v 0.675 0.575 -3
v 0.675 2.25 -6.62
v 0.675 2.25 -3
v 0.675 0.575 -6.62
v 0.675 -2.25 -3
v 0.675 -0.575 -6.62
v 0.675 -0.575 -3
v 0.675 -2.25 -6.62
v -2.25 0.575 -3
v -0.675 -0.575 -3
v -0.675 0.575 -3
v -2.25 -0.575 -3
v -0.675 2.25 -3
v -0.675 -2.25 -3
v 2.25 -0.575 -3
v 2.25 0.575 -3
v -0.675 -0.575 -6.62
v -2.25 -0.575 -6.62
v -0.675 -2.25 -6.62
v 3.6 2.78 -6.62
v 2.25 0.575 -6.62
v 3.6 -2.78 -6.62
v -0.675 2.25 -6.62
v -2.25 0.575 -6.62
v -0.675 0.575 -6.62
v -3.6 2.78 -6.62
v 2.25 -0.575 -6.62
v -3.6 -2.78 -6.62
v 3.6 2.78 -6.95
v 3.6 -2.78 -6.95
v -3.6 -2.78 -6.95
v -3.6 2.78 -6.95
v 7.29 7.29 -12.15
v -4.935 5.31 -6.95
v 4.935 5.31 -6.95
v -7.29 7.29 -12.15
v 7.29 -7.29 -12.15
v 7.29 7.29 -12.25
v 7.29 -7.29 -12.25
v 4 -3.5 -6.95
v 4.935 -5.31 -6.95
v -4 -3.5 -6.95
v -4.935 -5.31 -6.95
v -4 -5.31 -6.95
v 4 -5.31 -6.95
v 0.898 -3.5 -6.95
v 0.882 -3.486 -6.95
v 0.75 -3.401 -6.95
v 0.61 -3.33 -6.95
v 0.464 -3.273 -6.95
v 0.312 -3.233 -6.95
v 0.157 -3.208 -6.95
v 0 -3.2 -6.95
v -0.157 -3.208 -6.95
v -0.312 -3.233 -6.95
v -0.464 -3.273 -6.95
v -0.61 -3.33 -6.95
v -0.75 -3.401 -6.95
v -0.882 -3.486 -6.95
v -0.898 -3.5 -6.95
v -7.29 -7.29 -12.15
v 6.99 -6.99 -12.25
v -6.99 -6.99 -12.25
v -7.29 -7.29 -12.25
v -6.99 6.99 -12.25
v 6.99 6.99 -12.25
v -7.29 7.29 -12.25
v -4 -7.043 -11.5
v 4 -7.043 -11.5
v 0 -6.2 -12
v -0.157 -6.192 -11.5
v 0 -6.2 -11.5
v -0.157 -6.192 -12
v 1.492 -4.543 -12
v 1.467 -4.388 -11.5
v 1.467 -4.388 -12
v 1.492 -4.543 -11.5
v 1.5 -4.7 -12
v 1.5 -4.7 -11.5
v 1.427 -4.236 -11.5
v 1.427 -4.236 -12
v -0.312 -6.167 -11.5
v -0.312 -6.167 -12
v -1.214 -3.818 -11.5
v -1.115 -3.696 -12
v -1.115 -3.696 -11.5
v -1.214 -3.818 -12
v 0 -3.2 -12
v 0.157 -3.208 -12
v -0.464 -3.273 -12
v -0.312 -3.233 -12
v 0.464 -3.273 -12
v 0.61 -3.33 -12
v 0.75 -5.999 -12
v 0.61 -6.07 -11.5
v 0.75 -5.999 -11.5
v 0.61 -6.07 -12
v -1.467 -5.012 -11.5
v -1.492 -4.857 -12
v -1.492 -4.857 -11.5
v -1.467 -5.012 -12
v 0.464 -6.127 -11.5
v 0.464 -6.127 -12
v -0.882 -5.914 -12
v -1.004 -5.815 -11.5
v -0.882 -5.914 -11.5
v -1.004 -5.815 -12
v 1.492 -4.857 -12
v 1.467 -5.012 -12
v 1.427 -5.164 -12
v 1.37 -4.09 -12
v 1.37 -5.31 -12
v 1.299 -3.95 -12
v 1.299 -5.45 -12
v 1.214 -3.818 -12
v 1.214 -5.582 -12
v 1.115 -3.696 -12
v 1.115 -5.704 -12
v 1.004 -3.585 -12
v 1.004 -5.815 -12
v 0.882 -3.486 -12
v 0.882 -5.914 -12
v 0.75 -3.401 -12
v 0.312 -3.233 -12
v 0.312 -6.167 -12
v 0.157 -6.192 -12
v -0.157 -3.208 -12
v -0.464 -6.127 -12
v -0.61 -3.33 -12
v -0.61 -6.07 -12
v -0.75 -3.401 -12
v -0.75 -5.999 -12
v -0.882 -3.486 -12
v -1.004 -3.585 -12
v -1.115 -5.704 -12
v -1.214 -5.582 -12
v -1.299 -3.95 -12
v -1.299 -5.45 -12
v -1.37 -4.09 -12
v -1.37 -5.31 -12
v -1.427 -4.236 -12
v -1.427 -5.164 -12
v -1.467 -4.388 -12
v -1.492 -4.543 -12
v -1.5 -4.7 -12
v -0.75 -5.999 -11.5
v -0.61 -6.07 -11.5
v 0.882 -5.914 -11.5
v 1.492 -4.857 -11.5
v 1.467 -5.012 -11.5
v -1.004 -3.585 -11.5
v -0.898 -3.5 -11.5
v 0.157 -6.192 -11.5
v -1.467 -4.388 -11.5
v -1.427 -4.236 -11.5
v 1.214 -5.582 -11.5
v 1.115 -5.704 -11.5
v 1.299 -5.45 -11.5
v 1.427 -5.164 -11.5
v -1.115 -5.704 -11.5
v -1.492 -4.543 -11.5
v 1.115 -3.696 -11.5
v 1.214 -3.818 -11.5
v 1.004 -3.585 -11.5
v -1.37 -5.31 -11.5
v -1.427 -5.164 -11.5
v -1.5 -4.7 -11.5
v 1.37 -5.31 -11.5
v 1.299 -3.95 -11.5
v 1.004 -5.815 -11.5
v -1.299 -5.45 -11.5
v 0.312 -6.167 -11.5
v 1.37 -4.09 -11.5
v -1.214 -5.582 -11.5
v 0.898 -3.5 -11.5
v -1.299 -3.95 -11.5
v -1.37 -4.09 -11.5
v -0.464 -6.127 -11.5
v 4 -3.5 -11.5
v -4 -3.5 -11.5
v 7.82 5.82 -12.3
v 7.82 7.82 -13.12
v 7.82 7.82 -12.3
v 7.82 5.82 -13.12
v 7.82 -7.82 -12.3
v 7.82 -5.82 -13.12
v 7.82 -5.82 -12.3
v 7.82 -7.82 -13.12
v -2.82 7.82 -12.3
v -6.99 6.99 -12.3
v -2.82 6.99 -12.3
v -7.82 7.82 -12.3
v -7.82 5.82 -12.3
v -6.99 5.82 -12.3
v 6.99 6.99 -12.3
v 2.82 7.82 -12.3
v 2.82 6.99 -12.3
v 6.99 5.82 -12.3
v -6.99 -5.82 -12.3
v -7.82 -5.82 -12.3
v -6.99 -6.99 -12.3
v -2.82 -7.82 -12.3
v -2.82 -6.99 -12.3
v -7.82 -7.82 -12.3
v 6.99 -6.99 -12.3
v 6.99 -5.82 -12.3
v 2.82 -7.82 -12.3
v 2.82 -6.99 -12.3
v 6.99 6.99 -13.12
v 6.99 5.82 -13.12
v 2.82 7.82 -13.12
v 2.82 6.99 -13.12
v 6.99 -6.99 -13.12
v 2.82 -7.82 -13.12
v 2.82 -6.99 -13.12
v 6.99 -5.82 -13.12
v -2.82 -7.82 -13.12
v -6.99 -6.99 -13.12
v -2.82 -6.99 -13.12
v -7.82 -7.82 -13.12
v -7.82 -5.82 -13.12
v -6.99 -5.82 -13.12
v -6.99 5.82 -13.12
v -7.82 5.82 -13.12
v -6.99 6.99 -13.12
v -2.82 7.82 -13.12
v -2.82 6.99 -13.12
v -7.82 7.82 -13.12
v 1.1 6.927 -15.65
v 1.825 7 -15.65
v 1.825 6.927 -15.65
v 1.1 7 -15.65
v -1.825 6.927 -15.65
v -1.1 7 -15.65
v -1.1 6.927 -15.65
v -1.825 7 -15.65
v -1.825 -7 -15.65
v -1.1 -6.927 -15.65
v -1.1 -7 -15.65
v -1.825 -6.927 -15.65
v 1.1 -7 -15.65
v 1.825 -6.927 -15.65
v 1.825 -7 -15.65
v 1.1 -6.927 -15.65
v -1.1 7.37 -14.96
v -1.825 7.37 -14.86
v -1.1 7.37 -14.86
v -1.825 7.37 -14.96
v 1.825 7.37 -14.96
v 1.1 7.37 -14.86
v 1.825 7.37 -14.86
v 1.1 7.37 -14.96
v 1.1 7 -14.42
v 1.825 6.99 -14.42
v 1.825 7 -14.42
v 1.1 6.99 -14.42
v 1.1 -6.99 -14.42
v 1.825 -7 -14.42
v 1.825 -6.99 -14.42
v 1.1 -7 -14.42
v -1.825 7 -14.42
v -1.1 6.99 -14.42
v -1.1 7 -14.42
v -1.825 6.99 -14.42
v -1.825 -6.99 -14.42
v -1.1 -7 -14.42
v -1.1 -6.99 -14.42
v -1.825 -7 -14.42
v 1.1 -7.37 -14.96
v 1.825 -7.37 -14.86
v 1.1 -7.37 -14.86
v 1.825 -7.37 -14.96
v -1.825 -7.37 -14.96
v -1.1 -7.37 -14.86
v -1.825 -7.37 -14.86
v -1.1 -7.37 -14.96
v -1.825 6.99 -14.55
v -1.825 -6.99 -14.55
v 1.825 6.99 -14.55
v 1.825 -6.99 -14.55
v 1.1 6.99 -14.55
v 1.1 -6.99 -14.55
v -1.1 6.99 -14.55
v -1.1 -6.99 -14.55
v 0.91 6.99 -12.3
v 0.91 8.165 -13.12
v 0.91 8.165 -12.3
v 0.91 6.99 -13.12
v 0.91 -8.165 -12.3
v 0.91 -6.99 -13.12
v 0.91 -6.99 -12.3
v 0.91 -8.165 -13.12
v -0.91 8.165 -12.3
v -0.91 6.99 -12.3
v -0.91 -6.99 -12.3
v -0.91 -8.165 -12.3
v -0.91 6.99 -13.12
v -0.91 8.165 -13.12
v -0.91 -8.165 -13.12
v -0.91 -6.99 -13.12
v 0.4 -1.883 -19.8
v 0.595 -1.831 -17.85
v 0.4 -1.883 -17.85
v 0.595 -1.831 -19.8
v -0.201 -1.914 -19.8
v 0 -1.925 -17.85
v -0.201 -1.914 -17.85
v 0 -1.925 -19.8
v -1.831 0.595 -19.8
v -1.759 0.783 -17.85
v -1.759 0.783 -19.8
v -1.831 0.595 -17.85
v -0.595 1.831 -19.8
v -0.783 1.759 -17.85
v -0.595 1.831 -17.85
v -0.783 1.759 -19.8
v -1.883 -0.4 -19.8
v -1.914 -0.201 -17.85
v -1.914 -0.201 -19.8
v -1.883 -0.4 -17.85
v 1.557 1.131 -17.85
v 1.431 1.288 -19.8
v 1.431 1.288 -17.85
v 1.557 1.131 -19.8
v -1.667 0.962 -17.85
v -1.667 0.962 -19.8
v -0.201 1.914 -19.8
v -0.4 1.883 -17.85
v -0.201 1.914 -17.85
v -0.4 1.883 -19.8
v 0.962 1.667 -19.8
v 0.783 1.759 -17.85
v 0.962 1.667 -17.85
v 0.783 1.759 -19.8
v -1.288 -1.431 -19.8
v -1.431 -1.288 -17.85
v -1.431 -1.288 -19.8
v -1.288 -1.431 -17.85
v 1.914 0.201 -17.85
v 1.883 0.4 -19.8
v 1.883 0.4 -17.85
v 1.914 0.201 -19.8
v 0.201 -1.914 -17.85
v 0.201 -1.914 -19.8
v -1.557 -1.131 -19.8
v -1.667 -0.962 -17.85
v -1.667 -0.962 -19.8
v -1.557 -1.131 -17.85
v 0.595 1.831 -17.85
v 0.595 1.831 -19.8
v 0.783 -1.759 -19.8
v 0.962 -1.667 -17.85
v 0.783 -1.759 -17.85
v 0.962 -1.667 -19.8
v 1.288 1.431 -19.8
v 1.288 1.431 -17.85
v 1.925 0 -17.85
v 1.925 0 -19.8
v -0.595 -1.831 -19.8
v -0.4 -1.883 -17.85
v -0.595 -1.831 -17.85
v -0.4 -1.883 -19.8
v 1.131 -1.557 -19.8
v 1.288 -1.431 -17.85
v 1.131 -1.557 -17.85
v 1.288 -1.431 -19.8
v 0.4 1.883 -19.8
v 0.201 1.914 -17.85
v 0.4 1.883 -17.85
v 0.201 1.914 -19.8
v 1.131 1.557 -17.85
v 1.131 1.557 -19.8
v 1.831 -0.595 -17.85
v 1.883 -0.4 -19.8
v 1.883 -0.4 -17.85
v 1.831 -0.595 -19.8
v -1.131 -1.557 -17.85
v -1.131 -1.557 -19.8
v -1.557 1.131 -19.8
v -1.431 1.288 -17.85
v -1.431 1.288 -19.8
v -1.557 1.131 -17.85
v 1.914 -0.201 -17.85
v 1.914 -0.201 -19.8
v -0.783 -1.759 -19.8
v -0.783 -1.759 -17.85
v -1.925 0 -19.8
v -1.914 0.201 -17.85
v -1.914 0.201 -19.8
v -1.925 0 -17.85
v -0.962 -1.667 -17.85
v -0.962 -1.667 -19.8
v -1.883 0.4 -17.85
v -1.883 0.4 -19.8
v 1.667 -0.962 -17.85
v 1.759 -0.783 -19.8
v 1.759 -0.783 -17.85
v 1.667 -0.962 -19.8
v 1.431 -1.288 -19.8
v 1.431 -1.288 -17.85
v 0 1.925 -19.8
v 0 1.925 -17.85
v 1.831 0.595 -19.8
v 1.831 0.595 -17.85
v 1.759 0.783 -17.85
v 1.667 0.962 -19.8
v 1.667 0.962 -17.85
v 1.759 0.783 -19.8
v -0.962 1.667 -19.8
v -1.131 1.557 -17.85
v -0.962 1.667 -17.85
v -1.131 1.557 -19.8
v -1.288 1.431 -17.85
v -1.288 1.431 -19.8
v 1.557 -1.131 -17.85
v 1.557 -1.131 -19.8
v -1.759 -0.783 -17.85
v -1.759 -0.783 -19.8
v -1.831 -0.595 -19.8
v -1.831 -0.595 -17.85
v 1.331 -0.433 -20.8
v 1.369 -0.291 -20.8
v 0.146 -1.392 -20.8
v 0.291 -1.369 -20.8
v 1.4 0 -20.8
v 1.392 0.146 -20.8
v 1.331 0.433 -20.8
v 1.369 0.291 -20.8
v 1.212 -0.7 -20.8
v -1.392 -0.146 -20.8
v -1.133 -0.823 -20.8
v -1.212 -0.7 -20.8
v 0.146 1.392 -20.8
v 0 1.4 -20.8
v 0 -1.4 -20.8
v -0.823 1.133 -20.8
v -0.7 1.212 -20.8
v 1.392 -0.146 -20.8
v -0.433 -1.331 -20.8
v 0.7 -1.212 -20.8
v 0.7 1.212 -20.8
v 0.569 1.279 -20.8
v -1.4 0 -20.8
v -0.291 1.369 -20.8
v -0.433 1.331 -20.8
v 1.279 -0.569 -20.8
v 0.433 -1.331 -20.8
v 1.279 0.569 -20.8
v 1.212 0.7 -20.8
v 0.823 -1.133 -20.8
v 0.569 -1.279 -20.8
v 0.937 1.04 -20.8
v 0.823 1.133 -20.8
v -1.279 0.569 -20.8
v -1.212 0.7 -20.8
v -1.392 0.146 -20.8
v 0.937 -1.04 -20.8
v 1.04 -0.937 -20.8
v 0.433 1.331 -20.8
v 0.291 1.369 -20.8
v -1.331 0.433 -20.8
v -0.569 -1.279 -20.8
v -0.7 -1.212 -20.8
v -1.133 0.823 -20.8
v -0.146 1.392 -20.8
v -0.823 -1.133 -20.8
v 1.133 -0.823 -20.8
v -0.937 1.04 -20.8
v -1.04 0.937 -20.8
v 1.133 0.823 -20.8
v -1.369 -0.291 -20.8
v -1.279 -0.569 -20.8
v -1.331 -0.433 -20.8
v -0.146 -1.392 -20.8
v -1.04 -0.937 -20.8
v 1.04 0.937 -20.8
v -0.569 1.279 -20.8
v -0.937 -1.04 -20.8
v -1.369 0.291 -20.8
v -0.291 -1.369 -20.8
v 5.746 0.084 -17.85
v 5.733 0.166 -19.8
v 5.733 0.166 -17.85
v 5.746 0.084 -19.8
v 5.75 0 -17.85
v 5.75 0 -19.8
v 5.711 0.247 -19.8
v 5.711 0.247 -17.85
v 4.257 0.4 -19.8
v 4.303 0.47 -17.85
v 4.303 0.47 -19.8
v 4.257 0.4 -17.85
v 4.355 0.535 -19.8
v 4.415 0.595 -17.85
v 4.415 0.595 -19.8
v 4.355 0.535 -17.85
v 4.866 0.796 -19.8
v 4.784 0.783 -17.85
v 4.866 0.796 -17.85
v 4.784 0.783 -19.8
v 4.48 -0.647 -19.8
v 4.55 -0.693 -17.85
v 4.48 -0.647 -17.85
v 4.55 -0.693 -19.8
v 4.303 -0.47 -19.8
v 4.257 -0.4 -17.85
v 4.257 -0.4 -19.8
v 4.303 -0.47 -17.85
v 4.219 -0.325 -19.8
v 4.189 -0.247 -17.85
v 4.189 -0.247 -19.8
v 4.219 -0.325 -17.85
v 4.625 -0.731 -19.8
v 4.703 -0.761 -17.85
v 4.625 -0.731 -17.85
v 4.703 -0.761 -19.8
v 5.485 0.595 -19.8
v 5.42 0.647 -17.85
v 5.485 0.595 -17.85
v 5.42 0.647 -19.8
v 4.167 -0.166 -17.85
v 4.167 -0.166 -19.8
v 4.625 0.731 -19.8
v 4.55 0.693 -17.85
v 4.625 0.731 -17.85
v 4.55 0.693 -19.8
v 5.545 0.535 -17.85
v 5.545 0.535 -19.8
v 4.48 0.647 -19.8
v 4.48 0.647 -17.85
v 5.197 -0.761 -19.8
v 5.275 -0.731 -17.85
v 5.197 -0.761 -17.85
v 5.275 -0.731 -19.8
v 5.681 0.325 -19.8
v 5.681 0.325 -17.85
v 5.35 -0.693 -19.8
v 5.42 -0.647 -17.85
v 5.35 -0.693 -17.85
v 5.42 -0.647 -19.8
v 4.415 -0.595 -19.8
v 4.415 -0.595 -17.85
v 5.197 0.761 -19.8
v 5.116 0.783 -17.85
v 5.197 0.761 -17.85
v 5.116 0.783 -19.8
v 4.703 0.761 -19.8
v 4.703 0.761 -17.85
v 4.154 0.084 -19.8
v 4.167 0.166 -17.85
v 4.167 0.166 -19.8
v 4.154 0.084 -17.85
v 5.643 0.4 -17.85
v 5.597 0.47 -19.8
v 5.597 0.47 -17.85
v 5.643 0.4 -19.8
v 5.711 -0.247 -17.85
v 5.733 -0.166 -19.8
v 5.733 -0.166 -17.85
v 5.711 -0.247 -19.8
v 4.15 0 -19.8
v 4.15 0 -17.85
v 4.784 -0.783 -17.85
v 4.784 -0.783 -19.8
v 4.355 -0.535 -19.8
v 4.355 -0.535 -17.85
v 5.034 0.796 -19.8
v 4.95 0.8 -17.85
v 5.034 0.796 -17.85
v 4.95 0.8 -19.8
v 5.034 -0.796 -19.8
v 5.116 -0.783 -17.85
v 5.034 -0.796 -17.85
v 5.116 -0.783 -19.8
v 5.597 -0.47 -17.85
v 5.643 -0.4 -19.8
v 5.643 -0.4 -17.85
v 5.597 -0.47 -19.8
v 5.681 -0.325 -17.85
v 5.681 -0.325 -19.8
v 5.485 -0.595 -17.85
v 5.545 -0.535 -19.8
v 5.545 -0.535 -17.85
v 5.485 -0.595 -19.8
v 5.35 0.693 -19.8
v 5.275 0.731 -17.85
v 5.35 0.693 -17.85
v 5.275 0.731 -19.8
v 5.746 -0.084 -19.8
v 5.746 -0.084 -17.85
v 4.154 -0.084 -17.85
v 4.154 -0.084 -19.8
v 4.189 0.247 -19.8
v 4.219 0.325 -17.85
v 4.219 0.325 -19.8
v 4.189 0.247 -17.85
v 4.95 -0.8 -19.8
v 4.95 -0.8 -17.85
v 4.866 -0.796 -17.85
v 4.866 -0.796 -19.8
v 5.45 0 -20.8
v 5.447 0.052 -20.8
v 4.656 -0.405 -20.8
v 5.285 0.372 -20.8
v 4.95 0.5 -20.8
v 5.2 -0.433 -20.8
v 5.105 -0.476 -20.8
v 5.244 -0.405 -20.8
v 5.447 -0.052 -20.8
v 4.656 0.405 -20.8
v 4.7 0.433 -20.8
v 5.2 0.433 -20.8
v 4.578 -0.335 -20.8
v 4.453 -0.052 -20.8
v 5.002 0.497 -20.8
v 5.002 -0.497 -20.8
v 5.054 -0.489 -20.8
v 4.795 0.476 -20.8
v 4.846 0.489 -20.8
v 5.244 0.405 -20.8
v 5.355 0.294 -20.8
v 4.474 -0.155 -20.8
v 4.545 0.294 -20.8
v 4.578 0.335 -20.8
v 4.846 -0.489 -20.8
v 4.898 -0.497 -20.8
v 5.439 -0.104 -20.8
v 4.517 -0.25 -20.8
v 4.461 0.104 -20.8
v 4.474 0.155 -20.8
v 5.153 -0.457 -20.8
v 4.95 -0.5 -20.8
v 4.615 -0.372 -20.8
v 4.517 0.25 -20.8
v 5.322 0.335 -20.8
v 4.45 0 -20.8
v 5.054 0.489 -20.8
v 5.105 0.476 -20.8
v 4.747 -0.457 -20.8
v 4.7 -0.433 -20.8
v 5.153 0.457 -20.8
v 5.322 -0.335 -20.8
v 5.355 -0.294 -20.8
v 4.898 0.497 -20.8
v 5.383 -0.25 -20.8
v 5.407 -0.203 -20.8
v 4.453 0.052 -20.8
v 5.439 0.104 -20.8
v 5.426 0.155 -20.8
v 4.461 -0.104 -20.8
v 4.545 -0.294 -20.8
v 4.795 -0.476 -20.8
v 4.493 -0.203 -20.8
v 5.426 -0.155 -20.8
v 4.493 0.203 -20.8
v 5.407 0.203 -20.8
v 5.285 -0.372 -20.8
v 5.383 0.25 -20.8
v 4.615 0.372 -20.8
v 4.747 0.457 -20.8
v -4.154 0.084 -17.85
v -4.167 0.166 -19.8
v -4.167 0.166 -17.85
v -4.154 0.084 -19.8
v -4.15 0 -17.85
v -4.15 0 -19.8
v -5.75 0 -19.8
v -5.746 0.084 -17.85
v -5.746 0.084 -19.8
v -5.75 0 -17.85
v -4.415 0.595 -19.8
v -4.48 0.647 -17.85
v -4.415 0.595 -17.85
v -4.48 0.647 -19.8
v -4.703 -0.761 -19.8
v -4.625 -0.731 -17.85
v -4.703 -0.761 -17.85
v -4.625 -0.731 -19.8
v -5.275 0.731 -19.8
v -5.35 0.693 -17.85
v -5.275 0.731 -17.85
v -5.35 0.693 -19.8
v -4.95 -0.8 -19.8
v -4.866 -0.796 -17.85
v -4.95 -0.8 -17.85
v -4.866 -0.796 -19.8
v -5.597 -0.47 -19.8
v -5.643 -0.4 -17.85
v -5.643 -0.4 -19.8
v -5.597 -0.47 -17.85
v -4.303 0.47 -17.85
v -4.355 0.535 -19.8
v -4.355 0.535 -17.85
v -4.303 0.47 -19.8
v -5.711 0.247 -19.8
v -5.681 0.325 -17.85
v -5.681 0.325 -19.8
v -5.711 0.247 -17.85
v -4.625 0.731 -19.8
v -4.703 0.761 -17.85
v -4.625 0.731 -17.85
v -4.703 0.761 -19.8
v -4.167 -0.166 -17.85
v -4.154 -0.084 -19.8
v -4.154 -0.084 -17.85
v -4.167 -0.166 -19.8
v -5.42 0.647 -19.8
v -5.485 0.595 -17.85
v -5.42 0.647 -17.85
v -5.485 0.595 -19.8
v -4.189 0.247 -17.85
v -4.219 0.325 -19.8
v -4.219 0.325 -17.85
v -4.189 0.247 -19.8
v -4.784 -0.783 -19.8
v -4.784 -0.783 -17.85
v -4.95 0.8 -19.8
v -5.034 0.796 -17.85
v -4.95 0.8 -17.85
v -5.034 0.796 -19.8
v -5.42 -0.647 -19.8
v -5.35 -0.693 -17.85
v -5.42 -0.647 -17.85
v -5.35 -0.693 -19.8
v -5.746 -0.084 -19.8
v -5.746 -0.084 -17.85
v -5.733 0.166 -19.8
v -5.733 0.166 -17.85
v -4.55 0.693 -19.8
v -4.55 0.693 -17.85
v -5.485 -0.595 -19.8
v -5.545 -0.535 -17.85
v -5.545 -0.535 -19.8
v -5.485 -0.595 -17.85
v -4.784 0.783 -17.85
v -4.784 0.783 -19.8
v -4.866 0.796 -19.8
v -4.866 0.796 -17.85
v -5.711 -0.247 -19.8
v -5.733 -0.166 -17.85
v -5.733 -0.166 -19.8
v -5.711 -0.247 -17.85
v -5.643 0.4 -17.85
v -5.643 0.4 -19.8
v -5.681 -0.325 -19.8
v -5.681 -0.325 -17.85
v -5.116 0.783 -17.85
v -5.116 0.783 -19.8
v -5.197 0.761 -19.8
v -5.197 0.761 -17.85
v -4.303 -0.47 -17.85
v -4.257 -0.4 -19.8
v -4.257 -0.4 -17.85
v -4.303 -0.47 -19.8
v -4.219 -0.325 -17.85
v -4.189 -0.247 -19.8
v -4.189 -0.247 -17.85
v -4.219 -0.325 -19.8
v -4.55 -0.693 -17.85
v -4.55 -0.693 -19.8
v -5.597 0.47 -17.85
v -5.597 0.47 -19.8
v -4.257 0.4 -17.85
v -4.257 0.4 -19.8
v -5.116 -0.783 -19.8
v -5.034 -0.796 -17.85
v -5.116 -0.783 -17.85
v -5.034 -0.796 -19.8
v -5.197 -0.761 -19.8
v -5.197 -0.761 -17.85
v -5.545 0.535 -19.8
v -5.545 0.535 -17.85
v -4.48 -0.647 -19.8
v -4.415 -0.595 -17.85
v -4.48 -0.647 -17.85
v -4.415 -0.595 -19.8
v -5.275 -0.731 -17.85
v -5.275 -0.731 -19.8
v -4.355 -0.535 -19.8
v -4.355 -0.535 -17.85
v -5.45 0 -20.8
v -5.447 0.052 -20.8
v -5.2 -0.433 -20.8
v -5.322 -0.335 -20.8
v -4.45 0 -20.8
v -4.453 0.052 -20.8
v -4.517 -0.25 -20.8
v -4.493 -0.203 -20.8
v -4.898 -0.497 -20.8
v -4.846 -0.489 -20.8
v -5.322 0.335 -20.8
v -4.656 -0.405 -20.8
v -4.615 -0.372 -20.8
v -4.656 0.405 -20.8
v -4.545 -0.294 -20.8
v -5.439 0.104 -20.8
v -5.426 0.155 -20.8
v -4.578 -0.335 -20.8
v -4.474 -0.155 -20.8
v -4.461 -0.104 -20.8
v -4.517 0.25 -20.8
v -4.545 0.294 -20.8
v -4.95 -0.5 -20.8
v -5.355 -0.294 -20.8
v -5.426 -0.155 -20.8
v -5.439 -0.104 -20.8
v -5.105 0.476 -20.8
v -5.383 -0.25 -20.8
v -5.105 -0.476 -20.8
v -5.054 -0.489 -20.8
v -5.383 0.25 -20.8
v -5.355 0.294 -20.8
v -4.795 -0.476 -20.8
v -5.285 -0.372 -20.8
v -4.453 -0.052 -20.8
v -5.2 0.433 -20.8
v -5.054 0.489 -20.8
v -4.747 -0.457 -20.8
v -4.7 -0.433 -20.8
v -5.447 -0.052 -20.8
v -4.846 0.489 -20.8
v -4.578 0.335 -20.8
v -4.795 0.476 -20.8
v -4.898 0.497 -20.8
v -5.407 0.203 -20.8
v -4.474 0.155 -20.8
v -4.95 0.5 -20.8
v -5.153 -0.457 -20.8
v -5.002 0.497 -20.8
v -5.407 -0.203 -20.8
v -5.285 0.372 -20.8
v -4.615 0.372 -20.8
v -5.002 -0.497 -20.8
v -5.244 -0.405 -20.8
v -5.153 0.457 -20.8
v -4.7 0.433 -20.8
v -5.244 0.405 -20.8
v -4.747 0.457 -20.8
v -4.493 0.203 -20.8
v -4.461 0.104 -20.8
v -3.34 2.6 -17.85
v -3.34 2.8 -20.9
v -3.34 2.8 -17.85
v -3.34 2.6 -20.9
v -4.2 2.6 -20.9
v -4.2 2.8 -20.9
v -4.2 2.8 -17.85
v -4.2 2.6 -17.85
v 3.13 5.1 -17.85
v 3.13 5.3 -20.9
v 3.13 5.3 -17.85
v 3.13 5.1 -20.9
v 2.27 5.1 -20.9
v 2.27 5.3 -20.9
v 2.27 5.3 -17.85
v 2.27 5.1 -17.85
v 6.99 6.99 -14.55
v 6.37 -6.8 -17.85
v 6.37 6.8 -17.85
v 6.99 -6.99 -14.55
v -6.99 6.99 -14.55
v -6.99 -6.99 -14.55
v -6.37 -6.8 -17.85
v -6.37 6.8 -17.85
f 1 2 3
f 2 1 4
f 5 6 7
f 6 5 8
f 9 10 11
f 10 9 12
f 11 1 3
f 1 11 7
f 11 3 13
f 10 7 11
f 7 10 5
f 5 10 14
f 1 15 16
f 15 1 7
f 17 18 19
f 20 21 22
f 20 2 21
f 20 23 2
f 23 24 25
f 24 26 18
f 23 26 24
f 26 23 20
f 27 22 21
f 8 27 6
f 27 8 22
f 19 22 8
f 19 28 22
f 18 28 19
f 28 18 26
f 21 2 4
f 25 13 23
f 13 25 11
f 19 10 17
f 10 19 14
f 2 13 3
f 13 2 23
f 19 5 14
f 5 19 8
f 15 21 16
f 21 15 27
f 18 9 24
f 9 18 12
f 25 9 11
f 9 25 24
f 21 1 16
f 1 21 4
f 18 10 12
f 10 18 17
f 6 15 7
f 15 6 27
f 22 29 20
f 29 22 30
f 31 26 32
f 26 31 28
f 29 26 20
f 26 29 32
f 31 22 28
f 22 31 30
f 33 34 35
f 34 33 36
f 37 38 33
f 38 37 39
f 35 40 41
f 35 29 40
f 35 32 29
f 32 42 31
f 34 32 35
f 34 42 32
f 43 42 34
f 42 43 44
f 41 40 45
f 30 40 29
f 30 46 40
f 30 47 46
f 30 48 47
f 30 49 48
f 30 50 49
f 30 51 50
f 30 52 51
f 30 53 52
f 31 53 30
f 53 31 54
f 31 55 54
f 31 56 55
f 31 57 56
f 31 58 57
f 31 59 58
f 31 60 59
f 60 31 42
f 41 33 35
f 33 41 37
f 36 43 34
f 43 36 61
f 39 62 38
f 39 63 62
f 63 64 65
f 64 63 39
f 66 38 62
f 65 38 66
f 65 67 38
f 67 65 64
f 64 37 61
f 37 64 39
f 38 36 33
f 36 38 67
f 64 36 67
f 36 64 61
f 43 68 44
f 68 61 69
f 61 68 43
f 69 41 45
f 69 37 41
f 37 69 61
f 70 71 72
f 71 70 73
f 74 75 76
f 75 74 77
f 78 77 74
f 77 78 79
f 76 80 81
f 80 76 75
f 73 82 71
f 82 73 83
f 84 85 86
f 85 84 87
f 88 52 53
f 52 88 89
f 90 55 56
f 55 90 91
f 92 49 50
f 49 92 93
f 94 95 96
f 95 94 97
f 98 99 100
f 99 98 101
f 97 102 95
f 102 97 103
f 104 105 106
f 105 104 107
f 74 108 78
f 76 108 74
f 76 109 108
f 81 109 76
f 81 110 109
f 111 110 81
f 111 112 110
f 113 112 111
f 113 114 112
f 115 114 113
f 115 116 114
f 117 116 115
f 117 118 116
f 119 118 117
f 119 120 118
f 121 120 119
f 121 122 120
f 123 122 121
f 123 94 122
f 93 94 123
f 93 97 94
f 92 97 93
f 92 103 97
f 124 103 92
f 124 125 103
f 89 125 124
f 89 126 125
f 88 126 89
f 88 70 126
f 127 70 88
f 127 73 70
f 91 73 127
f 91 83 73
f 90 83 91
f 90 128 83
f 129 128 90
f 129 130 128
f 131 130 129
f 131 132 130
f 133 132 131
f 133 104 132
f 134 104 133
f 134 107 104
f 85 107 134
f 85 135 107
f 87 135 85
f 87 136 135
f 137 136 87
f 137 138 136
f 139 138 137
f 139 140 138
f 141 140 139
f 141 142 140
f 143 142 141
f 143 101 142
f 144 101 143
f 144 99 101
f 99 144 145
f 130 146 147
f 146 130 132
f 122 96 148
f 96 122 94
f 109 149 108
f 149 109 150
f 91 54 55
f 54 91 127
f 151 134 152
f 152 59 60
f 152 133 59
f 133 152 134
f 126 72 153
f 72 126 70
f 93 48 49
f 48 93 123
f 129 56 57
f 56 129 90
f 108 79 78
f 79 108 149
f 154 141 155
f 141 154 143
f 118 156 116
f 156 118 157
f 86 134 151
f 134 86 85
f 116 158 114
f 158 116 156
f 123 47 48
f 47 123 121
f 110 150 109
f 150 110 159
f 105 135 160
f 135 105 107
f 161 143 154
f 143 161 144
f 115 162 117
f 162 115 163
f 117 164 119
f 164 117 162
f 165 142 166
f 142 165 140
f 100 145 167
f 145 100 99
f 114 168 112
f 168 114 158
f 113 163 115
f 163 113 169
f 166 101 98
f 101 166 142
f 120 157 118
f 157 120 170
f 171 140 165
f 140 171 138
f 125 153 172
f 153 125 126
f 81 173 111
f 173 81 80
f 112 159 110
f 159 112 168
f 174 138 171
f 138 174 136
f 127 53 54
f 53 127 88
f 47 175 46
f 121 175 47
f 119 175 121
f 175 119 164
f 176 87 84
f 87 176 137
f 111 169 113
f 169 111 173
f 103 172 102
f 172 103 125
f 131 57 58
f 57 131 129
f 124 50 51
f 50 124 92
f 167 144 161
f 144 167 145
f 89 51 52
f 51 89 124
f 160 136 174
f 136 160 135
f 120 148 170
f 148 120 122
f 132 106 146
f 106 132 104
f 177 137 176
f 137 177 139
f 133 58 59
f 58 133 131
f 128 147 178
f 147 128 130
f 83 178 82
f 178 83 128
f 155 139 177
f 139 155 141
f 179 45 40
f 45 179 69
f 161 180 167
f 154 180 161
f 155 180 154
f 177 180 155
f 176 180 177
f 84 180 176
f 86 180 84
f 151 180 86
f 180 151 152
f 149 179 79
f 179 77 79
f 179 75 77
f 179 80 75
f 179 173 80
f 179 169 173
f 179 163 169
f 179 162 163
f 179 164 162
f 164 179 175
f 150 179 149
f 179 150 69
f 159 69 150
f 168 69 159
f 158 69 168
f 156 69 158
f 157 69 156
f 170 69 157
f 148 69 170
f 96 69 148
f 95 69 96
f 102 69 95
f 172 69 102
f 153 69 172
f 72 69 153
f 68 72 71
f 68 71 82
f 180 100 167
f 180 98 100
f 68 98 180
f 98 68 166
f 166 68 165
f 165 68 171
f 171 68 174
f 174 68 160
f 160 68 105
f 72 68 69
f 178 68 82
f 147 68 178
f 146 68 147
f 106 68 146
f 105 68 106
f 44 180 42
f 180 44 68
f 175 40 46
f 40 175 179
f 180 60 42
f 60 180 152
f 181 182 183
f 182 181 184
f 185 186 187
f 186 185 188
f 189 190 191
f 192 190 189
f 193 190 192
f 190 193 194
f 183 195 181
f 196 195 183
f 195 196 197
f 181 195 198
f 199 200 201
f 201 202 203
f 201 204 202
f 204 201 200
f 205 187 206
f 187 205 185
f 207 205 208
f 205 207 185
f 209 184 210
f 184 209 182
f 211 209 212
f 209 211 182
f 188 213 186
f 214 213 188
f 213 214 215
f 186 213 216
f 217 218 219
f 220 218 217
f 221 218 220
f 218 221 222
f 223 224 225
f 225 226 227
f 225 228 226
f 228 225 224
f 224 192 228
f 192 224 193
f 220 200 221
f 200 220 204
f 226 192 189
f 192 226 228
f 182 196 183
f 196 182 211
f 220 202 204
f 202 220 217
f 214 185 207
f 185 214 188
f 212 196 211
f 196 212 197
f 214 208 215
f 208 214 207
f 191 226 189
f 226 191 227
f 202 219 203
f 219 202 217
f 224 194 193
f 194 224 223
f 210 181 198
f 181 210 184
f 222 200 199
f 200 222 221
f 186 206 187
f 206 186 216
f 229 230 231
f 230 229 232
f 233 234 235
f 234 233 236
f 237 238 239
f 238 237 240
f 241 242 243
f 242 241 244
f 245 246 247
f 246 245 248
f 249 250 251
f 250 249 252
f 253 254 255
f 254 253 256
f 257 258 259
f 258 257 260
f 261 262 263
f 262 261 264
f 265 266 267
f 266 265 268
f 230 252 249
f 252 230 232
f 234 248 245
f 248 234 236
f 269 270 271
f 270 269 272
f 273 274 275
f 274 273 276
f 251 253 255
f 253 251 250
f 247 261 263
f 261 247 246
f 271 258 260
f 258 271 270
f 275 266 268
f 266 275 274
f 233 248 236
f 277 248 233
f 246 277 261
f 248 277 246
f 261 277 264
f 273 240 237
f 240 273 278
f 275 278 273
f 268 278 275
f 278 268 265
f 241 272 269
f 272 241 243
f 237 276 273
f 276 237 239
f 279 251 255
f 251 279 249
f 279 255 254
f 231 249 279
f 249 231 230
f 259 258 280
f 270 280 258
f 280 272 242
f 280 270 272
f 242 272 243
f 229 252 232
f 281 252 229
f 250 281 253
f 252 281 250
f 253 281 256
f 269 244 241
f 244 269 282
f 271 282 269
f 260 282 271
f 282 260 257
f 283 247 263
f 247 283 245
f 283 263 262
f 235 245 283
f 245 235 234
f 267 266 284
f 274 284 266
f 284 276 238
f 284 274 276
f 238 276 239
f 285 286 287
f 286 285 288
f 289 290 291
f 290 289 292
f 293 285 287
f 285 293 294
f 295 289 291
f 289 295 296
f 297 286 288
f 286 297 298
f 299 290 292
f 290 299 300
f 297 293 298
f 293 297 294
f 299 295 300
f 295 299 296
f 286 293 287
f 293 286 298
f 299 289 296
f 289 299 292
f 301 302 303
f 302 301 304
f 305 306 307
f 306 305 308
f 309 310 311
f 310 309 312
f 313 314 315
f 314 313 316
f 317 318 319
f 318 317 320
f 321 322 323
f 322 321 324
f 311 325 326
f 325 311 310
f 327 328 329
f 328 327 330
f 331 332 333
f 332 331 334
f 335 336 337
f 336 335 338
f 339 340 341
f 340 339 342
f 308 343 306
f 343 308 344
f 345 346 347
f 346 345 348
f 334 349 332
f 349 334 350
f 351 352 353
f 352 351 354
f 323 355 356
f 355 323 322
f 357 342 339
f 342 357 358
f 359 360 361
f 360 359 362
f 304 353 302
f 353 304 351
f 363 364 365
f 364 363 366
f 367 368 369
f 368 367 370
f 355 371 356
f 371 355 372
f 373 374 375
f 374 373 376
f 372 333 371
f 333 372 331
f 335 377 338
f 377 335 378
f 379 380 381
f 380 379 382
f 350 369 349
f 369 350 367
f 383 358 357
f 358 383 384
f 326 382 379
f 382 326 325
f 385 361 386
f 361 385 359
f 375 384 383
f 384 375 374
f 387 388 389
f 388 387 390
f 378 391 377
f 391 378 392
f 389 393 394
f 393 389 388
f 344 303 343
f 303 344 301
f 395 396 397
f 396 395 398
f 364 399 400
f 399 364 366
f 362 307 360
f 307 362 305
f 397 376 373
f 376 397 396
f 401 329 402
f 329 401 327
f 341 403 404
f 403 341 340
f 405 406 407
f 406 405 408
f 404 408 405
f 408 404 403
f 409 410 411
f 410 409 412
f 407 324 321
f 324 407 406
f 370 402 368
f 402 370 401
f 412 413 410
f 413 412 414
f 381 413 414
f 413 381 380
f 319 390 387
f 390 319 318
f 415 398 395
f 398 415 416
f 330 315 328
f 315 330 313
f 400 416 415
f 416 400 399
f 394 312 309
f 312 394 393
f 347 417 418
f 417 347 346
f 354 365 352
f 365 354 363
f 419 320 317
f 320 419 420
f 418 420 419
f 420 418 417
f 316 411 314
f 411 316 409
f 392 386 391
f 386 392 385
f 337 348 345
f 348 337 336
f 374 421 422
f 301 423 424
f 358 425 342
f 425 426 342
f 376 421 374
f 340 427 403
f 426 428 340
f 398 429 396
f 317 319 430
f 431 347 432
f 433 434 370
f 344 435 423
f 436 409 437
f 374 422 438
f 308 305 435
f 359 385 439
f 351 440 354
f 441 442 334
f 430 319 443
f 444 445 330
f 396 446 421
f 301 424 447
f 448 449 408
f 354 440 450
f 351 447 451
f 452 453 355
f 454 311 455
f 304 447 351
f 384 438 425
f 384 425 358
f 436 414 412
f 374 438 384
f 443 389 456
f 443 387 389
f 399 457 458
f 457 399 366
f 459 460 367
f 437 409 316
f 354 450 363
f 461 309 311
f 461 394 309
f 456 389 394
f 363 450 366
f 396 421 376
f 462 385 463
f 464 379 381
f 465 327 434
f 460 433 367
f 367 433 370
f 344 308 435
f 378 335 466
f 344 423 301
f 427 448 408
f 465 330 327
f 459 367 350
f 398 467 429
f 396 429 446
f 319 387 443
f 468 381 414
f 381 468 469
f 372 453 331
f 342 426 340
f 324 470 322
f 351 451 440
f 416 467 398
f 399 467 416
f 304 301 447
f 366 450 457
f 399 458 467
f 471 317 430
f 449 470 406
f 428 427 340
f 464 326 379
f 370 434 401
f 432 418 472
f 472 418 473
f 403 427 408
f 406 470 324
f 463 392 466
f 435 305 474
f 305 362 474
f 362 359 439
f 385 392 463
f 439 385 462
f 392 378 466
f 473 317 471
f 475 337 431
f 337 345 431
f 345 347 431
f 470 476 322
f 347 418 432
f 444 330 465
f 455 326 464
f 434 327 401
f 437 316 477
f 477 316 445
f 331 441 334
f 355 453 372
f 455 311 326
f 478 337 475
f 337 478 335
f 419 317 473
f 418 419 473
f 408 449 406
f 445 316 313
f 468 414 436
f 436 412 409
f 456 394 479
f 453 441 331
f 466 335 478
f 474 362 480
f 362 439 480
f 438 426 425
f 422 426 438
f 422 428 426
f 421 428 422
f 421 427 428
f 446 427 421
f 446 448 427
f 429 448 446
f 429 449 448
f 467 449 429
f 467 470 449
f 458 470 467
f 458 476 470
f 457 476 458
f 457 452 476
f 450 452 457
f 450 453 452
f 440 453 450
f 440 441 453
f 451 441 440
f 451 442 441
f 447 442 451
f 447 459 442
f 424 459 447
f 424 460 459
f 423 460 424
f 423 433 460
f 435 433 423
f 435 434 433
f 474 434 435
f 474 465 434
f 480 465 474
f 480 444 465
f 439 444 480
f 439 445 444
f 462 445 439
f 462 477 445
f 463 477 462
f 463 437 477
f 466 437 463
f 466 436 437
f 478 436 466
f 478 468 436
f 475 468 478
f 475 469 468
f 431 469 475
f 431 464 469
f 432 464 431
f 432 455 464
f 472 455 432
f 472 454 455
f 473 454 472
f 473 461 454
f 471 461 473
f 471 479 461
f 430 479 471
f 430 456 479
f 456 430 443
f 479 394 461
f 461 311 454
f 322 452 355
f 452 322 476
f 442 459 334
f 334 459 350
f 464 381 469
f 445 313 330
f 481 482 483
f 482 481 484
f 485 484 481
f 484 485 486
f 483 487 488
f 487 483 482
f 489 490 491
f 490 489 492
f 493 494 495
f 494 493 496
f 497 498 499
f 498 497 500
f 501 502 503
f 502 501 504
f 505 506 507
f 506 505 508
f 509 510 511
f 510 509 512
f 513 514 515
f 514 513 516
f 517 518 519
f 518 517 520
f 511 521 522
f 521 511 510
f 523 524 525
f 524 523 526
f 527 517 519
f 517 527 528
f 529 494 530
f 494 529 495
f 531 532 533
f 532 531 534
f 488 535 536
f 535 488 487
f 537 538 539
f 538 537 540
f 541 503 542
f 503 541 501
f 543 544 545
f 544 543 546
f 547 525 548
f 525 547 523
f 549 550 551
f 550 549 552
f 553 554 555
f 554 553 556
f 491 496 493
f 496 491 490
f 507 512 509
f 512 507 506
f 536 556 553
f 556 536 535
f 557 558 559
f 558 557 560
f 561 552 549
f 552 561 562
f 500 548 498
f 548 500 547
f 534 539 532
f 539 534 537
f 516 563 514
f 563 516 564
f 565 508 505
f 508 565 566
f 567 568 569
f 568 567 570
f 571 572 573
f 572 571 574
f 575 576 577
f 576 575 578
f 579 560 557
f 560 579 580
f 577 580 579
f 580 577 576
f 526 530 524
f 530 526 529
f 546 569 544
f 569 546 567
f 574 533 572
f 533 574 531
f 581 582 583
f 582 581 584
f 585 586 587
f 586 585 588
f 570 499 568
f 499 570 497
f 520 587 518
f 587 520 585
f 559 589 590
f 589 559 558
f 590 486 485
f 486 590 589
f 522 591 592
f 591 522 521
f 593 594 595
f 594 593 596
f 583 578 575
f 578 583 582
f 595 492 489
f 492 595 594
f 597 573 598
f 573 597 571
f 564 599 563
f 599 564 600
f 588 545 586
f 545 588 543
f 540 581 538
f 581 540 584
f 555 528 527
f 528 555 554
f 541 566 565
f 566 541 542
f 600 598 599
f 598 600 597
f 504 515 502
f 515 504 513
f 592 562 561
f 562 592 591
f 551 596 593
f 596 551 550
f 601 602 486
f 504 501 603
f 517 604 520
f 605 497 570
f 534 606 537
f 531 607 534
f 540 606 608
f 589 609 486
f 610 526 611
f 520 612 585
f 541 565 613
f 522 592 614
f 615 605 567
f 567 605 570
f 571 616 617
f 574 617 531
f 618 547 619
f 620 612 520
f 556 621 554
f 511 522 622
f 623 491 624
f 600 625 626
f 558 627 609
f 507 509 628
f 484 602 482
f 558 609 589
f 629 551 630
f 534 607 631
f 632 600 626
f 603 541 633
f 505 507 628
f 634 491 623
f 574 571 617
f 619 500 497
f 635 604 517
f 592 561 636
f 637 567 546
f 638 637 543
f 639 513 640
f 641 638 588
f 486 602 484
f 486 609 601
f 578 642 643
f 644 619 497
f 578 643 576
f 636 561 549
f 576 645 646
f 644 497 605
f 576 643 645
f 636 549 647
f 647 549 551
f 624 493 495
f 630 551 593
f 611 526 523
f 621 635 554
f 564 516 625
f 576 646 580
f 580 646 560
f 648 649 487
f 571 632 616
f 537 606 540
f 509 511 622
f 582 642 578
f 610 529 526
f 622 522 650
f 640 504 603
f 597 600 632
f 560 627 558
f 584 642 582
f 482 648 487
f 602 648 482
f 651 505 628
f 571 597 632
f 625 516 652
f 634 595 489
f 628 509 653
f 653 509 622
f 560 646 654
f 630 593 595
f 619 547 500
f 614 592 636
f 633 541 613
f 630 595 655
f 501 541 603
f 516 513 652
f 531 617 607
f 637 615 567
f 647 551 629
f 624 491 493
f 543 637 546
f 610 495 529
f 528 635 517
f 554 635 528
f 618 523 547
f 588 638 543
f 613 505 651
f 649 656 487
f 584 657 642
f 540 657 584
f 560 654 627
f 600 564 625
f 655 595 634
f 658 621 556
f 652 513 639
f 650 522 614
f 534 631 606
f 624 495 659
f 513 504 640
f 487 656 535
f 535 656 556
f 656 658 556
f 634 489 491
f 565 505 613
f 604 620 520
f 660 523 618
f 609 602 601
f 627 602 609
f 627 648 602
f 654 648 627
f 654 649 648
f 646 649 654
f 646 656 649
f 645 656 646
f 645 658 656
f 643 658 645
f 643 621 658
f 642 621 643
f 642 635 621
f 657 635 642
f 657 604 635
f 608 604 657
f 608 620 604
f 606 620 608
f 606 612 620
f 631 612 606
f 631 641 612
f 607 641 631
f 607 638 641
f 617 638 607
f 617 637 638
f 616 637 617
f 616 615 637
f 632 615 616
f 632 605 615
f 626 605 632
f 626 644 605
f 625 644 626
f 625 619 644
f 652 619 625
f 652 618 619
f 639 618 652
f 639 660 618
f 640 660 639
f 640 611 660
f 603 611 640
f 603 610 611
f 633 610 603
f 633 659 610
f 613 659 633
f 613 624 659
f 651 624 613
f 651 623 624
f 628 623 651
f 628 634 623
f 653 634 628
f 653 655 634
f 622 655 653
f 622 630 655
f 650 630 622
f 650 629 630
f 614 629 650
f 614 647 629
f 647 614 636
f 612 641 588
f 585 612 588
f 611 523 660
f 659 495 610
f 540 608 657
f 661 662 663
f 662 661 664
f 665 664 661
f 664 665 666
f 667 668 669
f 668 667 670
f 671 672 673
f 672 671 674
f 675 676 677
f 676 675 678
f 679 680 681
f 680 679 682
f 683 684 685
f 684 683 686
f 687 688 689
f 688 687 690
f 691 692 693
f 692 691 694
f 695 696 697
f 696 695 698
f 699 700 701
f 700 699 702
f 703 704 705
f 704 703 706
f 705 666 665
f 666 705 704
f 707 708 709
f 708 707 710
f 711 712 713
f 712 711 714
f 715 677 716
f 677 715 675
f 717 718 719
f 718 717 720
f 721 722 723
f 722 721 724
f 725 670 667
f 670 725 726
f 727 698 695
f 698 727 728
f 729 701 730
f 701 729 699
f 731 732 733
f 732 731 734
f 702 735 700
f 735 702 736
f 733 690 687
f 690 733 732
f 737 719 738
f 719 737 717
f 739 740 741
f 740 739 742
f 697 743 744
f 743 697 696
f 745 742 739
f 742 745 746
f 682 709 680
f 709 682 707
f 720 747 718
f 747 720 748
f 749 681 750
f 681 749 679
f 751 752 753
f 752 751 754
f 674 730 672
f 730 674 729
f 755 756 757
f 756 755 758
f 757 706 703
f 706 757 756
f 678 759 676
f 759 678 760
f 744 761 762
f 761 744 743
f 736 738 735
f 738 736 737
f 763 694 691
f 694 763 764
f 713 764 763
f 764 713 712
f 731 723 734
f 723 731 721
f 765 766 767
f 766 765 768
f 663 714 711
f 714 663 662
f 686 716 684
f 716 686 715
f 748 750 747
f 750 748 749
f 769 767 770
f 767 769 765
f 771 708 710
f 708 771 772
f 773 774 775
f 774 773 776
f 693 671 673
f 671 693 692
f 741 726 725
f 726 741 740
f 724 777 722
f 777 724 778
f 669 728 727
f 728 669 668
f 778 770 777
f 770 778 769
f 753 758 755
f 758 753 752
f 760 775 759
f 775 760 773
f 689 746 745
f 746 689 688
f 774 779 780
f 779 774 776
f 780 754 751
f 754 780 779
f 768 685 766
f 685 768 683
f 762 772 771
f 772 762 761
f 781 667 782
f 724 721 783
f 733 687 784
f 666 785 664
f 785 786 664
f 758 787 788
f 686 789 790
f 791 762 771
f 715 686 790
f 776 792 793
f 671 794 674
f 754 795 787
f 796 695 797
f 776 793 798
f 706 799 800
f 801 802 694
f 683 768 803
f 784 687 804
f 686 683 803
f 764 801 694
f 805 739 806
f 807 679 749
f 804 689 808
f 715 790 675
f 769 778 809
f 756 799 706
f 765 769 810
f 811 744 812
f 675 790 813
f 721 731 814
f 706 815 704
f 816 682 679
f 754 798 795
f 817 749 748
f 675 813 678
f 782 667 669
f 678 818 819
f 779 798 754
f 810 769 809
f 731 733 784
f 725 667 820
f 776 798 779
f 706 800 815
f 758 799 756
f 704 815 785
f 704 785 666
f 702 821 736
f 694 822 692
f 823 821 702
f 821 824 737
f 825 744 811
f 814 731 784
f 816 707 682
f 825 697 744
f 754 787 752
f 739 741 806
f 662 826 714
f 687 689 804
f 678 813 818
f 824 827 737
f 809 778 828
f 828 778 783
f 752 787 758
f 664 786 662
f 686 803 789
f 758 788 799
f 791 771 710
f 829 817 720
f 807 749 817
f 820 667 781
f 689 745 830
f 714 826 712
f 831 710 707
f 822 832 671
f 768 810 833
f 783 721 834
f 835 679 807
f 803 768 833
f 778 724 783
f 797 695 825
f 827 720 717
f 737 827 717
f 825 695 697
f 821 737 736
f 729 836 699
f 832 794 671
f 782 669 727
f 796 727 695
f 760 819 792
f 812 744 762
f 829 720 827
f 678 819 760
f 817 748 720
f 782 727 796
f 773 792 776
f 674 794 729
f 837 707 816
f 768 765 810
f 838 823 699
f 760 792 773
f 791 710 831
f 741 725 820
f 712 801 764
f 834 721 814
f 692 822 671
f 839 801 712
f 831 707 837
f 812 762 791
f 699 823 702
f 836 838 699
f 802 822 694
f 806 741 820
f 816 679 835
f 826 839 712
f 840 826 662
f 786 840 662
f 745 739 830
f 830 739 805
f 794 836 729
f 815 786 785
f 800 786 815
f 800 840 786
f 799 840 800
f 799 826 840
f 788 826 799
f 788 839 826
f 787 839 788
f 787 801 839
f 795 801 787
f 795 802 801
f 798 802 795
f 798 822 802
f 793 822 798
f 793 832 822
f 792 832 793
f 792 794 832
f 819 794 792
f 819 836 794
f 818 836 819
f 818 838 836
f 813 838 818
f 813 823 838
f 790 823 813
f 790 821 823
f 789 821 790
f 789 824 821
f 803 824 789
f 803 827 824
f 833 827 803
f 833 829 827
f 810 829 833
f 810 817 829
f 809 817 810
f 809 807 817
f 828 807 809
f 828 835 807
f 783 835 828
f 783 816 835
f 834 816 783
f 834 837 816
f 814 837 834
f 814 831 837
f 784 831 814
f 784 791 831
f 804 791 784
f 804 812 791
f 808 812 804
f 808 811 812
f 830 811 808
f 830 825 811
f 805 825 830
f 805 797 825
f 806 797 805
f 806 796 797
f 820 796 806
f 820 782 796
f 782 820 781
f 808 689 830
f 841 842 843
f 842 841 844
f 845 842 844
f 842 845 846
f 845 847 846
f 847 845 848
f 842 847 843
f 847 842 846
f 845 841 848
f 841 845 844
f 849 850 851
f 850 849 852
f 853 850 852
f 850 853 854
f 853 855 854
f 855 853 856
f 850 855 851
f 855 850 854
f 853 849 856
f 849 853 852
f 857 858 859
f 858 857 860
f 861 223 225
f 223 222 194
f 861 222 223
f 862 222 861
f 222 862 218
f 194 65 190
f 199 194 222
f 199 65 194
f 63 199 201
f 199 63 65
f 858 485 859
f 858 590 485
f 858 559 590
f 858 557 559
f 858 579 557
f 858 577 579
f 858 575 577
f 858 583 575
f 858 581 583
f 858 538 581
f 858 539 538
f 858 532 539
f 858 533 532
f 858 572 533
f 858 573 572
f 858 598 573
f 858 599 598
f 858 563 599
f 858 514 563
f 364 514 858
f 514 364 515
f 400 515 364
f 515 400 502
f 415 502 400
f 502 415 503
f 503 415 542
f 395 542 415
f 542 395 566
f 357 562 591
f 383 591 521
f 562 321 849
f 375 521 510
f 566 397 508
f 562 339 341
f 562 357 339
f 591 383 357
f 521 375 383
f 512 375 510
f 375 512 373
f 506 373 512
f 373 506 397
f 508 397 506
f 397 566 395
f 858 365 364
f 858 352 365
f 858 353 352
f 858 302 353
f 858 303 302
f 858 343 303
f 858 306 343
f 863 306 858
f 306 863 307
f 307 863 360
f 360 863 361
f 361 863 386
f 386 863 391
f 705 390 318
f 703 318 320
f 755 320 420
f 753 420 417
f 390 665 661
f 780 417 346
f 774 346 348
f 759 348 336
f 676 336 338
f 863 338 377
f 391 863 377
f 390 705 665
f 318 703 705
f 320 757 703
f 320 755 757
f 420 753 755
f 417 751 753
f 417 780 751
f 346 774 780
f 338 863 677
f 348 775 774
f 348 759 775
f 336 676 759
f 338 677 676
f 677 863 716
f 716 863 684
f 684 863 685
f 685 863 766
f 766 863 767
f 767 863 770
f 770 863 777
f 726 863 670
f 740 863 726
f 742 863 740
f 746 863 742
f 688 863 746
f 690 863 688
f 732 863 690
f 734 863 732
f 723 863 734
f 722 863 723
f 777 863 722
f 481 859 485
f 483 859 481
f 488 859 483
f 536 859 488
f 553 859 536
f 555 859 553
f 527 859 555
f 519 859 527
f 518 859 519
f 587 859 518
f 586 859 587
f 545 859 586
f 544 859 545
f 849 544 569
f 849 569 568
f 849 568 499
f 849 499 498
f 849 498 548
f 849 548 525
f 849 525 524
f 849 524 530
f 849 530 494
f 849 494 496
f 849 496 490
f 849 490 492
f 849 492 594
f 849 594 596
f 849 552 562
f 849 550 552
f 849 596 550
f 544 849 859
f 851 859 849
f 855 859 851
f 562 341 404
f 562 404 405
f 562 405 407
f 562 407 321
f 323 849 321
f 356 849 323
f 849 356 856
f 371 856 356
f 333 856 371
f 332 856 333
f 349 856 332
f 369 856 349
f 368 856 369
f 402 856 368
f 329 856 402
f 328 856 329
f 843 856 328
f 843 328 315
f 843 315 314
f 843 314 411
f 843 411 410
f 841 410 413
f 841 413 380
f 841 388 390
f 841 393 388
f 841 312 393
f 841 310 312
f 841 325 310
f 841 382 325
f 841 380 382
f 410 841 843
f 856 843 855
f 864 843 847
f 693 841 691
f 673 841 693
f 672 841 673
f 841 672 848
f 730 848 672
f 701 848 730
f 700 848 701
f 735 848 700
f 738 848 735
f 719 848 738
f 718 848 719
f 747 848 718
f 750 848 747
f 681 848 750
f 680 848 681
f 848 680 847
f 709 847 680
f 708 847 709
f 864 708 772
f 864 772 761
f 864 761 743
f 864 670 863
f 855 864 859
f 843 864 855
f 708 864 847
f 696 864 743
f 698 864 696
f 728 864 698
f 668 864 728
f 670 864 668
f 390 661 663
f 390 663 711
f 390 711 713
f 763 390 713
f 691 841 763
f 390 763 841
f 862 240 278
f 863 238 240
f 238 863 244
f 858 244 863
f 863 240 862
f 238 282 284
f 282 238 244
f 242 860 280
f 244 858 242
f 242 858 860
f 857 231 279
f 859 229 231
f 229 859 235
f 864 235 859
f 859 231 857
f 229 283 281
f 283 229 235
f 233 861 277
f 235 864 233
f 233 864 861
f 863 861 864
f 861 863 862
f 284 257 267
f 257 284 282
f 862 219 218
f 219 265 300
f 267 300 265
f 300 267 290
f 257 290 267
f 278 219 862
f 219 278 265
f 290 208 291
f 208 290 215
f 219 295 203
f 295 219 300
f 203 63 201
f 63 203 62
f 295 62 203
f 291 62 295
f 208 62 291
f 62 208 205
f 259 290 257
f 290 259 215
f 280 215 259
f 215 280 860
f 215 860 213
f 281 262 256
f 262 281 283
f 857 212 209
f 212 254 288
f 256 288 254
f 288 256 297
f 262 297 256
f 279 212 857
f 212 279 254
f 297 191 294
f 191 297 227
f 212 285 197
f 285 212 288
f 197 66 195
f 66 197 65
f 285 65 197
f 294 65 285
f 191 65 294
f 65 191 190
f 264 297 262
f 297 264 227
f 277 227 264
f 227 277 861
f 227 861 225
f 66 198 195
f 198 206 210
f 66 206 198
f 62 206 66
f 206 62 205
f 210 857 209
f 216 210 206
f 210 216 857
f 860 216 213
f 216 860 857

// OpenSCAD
/* Source: https://bitbucket.org/gcb/3dump/src */

$fn=60;
/**
a cherry mx switch.

most of the measurements done with a caliper. some taken from
http://geekhack.org/index.php?topic=47744.0

This is just to illustrate and to drop in a a gross reference. It is mostly artistic apart from the steam and mounting plate dimensions
*/

// move the whole thing 3mm to give the empty space in usual keycaps.
// that is, the extra space inside a keycap female connector.
// i do that since i create all my keycaps with 0,0,0 being the internal base of the keycap

translate([0,0,-3])
{

	//1. steam
	color("brown"){
		//1.1. l-r tab is 1.35mm
		translate([0,0,-3.62/2])
			cube([1.35,4.5,3.62], center=true);
		//1.2. f-b tab is 1.15mm. it has a smal notch that i will ignore.
		translate([0,0,-3.62/2])
			cube([4.5,1.15,3.62], center=true);
		//1.3. base. it has a chamfered top that i will ignore.
		translate([0,0,-5.62])
			cube([7.2,5.56,4], center=true);
	}
	// 2. top
	color("grey"){
		difference(){
			// make a trapezoid with the general shape (volume?) of the top
			hull(){
				translate([0,0,-4]) //distance from top of switch... some i measured 3.9 others 4.2... so leaving at 4
					cube([9.87,10.62,0.1], center=true);
				translate([0,0,-4 -5.2]) // bottom has a measured 5.3... so move 5.2 and use the 0.1 bellow
					cube([14.58,14.58,0.1], center=true);
			}

		// and subtract:
		// the front led. NOTE: totally off... measured by eye. just for astetics
		// adding just so there is a visual cue of the direction
			translate([0,-4.7,-6])
				cylinder(r=3/2, h=6, center=true);
			translate([0,-5.5,-6])
				cube([8,4,5], center=true);
		// the four corners
			// TODO waste of time? this is all for looks, you shouldn't invade any of that space anyway...
		}
	}

	// 3. bottom
	color("green")
		// 3.1 main body volume
		hull(){
				translate([0,0,-4 -5.3]) //steam + top
					cube([13.98,13.98,0.1], center=true);
				translate([0,0,-4 -5.3 -2.2]) //steam + top + straigth part
					cube([13.98,13.98,0.1], center=true);
				translate([0,0,-4 -5.3 -5.5]) //steam + top + bottom (measured 5.5)
					cube([12.74,13.6,0.1], center=true);
		}
		// 3.2 tabs
		// note: only measured the lenght, if they are slightly off-center, this will be all wrong :)
		color("black")
		difference(){
			translate([0,0,-4 -5.3 -0.82/2]) //steam + top
				cube([15.64,15.64,0.82], center=true);
			translate([0,0,-4 -5.3 -0.82/2  ]) // front-back cut
				cube([5.64,20,0.82 +2], center=true);
			translate([0,0,-4 -5.3 -0.82/2  ]) //side cut
				cube([20,11.64,0.82 +2], center=true);
		}

		// 3.3 tab (plate snap on). to use this mechanically, you have to take into account the bending (as it will move the bottom part slightly up...) just for gross reference here for now
		color("white"){
			// 3.3.1 top
			translate([0,0,-4 -5.3 -0.82/2  ]) // front-back cut
				cube([1.82,16.33,0.82], center=true);
			// 3.3.2 bottom
			difference(){
				hull(){
					translate([0,0,-4 -5.3 -0.82/2 -1.76  ]) // front-back cut
						cube([3.65,14,0.1], center=true);
					translate([0,0,-4 -5.3 -0.82/2 -2.2  ]) // front-back cut
						cube([3.65,14.74,0.1], center=true);
					translate([0,0,-4 -5.3 -0.82/2 -2.89  ]) // front-back cut
						cube([3.65,14,0.1], center=true);
				}
				translate([0,0,-4 -5.3 -0.82/2 -1.76   ]) // front-back cut
					cube([2.2,20,4], center=true);

			}
		}

		// 4. bottom guides
		// again, i'm assuming everything is centered...
		color("darkGreen"){
			// 4.1 cylinder
			translate([0,0,-4 -5.3 -5.5 -2/2]) //steam + top + bottom (measured 5.5)
				cylinder(r=3.85/2, h=2, center=true);
			translate([0,0,-4 -5.3 -5.5 -2 -1/2]) //steam + top + bottom (measured 5.5)
				cylinder(r2=3.85/2, r=2.8/2, h=1, center=true);
			// 4.2 PCB pins
			translate([4.95,0,-4 -5.3 -5.5 -2/2]) //steam + top + bottom (measured 5.5)
				cylinder(r=1.6/2, h=2, center=true);
			translate([4.95,0,-4 -5.3 -5.5 -2 -1/2]) //steam + top + bottom (measured 5.5)
				cylinder(r2=1.6/2, r=1/2, h=1, center=true);
			translate([-4.95,0,-4 -5.3 -5.5 -2/2]) //steam + top + bottom (measured 5.5)
				cylinder(r=1.6/2, h=2, center=true);
			translate([-4.95,0,-4 -5.3 -5.5 -2 -1/2]) //steam + top + bottom (measured 5.5)
				cylinder(r2=1.6/2, r=1/2, h=1, center=true);
		}

		// 5. pins
		color("orange"){
			translate([-3.77,2.7,-4 -5.3 -5.5 -3.1/2]) //steam + top + bottom (measured 5.5)
				cube([.86, 0.2,3.1], center=true);
			translate([2.7,5.2,-4 -5.3 -5.5 -3.1/2]) //steam + top + bottom (measured 5.5)
				cube([.86, 0.2,3.1], center=true);
		}

}
